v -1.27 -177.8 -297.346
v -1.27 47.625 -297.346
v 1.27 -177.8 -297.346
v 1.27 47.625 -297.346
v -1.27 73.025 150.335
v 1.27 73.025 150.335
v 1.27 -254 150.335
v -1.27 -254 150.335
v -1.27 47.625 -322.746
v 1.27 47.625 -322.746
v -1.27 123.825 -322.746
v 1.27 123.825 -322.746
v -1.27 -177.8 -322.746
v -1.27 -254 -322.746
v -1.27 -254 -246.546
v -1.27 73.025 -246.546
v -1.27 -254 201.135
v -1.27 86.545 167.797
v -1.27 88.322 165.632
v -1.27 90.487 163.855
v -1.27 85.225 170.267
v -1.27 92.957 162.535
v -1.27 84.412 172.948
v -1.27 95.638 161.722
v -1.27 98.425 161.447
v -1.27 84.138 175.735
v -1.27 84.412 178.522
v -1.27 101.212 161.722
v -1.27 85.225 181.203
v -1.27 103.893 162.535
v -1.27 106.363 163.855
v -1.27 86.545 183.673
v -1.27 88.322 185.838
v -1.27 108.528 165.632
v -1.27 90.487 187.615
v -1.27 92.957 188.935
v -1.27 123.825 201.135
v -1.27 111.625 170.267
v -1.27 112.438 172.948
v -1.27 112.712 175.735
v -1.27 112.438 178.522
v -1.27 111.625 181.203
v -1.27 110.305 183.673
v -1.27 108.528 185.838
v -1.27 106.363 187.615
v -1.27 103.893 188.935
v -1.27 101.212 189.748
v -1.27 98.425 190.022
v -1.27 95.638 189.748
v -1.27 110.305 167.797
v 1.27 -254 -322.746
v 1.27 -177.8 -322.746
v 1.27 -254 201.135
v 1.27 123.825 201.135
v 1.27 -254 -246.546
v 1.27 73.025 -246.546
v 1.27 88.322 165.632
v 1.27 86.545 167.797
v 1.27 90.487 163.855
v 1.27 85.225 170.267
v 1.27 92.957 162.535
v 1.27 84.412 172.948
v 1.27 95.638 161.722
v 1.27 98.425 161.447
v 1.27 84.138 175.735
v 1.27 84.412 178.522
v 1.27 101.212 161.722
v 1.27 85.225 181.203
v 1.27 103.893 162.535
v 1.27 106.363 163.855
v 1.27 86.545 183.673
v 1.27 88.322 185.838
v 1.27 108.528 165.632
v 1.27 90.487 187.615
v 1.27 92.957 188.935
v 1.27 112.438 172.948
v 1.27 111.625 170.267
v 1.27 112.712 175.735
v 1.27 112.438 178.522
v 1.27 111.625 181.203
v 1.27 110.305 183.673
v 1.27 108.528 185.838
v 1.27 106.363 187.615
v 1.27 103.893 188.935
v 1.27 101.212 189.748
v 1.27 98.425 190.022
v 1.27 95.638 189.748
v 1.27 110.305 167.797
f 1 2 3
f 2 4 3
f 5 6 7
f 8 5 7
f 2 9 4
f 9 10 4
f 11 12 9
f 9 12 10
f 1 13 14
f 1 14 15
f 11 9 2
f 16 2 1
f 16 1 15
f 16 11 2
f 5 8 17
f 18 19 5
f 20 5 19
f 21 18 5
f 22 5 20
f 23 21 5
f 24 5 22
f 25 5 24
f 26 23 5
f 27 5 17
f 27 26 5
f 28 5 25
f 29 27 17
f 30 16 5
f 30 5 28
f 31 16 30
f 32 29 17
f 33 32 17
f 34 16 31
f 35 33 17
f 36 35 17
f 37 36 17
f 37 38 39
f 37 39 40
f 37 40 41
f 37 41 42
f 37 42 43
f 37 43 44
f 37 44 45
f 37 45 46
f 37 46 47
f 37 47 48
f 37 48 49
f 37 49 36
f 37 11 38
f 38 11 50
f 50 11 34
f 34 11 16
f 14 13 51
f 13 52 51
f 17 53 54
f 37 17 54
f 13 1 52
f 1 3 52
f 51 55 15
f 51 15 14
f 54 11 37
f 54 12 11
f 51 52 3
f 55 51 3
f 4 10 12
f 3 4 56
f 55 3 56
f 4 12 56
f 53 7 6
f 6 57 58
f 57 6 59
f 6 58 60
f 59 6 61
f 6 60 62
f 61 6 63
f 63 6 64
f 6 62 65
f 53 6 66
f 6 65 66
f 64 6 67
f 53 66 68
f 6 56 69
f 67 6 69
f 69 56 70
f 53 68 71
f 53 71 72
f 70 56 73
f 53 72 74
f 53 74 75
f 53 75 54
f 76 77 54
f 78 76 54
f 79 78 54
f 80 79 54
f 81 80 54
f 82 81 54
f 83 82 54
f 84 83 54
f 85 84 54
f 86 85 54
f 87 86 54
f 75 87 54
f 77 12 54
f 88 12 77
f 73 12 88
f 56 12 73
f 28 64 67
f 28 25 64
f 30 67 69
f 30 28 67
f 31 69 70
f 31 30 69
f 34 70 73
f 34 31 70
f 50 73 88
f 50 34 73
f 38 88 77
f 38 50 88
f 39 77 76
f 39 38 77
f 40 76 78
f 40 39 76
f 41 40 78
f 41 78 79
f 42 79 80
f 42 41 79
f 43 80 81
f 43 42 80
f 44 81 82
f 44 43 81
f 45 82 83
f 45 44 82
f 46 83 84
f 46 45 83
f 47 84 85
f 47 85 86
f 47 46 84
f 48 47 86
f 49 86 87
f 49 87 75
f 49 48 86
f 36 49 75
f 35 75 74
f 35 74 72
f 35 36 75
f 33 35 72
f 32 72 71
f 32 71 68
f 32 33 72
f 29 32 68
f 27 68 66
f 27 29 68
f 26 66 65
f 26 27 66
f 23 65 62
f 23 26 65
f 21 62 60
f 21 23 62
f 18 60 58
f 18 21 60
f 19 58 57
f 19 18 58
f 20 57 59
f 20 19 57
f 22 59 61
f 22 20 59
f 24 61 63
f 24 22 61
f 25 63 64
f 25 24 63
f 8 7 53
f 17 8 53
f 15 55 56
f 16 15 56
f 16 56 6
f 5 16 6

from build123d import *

# Parameters (mm, degrees)
SKETCH1_R           = 14.2875
BOSS_EXTRUDE1_DEPTH = 1.27


with BuildPart() as part:
    # Sketch1 → Boss-Extrude1 (new body, symmetric)
    with BuildSketch(Plane(origin=(0, 0, 0), x_dir=(0, 0, -1), z_dir=(1, 0, 0))):
        Polygon((-201.134911254, -254), (-201.134911254, 123.825), (297.346438746, 123.825), (322.746438746, 123.825), (322.746438746, 47.625), (297.346438746, 47.625), (297.346438746, -177.8), (322.746438746, -177.8), (322.746438746, -254), (297.346438746, -254), (246.546438746, -254), (246.546438746, 73.025), (-150.334911254, 73.025), (-150.334911254, -254), align=None)
        with Locations((-175.734911254, 98.425)):
            Circle(SKETCH1_R, mode=Mode.SUBTRACT)
    extrude(amount=BOSS_EXTRUDE1_DEPTH, both=True)


solid = part.part
